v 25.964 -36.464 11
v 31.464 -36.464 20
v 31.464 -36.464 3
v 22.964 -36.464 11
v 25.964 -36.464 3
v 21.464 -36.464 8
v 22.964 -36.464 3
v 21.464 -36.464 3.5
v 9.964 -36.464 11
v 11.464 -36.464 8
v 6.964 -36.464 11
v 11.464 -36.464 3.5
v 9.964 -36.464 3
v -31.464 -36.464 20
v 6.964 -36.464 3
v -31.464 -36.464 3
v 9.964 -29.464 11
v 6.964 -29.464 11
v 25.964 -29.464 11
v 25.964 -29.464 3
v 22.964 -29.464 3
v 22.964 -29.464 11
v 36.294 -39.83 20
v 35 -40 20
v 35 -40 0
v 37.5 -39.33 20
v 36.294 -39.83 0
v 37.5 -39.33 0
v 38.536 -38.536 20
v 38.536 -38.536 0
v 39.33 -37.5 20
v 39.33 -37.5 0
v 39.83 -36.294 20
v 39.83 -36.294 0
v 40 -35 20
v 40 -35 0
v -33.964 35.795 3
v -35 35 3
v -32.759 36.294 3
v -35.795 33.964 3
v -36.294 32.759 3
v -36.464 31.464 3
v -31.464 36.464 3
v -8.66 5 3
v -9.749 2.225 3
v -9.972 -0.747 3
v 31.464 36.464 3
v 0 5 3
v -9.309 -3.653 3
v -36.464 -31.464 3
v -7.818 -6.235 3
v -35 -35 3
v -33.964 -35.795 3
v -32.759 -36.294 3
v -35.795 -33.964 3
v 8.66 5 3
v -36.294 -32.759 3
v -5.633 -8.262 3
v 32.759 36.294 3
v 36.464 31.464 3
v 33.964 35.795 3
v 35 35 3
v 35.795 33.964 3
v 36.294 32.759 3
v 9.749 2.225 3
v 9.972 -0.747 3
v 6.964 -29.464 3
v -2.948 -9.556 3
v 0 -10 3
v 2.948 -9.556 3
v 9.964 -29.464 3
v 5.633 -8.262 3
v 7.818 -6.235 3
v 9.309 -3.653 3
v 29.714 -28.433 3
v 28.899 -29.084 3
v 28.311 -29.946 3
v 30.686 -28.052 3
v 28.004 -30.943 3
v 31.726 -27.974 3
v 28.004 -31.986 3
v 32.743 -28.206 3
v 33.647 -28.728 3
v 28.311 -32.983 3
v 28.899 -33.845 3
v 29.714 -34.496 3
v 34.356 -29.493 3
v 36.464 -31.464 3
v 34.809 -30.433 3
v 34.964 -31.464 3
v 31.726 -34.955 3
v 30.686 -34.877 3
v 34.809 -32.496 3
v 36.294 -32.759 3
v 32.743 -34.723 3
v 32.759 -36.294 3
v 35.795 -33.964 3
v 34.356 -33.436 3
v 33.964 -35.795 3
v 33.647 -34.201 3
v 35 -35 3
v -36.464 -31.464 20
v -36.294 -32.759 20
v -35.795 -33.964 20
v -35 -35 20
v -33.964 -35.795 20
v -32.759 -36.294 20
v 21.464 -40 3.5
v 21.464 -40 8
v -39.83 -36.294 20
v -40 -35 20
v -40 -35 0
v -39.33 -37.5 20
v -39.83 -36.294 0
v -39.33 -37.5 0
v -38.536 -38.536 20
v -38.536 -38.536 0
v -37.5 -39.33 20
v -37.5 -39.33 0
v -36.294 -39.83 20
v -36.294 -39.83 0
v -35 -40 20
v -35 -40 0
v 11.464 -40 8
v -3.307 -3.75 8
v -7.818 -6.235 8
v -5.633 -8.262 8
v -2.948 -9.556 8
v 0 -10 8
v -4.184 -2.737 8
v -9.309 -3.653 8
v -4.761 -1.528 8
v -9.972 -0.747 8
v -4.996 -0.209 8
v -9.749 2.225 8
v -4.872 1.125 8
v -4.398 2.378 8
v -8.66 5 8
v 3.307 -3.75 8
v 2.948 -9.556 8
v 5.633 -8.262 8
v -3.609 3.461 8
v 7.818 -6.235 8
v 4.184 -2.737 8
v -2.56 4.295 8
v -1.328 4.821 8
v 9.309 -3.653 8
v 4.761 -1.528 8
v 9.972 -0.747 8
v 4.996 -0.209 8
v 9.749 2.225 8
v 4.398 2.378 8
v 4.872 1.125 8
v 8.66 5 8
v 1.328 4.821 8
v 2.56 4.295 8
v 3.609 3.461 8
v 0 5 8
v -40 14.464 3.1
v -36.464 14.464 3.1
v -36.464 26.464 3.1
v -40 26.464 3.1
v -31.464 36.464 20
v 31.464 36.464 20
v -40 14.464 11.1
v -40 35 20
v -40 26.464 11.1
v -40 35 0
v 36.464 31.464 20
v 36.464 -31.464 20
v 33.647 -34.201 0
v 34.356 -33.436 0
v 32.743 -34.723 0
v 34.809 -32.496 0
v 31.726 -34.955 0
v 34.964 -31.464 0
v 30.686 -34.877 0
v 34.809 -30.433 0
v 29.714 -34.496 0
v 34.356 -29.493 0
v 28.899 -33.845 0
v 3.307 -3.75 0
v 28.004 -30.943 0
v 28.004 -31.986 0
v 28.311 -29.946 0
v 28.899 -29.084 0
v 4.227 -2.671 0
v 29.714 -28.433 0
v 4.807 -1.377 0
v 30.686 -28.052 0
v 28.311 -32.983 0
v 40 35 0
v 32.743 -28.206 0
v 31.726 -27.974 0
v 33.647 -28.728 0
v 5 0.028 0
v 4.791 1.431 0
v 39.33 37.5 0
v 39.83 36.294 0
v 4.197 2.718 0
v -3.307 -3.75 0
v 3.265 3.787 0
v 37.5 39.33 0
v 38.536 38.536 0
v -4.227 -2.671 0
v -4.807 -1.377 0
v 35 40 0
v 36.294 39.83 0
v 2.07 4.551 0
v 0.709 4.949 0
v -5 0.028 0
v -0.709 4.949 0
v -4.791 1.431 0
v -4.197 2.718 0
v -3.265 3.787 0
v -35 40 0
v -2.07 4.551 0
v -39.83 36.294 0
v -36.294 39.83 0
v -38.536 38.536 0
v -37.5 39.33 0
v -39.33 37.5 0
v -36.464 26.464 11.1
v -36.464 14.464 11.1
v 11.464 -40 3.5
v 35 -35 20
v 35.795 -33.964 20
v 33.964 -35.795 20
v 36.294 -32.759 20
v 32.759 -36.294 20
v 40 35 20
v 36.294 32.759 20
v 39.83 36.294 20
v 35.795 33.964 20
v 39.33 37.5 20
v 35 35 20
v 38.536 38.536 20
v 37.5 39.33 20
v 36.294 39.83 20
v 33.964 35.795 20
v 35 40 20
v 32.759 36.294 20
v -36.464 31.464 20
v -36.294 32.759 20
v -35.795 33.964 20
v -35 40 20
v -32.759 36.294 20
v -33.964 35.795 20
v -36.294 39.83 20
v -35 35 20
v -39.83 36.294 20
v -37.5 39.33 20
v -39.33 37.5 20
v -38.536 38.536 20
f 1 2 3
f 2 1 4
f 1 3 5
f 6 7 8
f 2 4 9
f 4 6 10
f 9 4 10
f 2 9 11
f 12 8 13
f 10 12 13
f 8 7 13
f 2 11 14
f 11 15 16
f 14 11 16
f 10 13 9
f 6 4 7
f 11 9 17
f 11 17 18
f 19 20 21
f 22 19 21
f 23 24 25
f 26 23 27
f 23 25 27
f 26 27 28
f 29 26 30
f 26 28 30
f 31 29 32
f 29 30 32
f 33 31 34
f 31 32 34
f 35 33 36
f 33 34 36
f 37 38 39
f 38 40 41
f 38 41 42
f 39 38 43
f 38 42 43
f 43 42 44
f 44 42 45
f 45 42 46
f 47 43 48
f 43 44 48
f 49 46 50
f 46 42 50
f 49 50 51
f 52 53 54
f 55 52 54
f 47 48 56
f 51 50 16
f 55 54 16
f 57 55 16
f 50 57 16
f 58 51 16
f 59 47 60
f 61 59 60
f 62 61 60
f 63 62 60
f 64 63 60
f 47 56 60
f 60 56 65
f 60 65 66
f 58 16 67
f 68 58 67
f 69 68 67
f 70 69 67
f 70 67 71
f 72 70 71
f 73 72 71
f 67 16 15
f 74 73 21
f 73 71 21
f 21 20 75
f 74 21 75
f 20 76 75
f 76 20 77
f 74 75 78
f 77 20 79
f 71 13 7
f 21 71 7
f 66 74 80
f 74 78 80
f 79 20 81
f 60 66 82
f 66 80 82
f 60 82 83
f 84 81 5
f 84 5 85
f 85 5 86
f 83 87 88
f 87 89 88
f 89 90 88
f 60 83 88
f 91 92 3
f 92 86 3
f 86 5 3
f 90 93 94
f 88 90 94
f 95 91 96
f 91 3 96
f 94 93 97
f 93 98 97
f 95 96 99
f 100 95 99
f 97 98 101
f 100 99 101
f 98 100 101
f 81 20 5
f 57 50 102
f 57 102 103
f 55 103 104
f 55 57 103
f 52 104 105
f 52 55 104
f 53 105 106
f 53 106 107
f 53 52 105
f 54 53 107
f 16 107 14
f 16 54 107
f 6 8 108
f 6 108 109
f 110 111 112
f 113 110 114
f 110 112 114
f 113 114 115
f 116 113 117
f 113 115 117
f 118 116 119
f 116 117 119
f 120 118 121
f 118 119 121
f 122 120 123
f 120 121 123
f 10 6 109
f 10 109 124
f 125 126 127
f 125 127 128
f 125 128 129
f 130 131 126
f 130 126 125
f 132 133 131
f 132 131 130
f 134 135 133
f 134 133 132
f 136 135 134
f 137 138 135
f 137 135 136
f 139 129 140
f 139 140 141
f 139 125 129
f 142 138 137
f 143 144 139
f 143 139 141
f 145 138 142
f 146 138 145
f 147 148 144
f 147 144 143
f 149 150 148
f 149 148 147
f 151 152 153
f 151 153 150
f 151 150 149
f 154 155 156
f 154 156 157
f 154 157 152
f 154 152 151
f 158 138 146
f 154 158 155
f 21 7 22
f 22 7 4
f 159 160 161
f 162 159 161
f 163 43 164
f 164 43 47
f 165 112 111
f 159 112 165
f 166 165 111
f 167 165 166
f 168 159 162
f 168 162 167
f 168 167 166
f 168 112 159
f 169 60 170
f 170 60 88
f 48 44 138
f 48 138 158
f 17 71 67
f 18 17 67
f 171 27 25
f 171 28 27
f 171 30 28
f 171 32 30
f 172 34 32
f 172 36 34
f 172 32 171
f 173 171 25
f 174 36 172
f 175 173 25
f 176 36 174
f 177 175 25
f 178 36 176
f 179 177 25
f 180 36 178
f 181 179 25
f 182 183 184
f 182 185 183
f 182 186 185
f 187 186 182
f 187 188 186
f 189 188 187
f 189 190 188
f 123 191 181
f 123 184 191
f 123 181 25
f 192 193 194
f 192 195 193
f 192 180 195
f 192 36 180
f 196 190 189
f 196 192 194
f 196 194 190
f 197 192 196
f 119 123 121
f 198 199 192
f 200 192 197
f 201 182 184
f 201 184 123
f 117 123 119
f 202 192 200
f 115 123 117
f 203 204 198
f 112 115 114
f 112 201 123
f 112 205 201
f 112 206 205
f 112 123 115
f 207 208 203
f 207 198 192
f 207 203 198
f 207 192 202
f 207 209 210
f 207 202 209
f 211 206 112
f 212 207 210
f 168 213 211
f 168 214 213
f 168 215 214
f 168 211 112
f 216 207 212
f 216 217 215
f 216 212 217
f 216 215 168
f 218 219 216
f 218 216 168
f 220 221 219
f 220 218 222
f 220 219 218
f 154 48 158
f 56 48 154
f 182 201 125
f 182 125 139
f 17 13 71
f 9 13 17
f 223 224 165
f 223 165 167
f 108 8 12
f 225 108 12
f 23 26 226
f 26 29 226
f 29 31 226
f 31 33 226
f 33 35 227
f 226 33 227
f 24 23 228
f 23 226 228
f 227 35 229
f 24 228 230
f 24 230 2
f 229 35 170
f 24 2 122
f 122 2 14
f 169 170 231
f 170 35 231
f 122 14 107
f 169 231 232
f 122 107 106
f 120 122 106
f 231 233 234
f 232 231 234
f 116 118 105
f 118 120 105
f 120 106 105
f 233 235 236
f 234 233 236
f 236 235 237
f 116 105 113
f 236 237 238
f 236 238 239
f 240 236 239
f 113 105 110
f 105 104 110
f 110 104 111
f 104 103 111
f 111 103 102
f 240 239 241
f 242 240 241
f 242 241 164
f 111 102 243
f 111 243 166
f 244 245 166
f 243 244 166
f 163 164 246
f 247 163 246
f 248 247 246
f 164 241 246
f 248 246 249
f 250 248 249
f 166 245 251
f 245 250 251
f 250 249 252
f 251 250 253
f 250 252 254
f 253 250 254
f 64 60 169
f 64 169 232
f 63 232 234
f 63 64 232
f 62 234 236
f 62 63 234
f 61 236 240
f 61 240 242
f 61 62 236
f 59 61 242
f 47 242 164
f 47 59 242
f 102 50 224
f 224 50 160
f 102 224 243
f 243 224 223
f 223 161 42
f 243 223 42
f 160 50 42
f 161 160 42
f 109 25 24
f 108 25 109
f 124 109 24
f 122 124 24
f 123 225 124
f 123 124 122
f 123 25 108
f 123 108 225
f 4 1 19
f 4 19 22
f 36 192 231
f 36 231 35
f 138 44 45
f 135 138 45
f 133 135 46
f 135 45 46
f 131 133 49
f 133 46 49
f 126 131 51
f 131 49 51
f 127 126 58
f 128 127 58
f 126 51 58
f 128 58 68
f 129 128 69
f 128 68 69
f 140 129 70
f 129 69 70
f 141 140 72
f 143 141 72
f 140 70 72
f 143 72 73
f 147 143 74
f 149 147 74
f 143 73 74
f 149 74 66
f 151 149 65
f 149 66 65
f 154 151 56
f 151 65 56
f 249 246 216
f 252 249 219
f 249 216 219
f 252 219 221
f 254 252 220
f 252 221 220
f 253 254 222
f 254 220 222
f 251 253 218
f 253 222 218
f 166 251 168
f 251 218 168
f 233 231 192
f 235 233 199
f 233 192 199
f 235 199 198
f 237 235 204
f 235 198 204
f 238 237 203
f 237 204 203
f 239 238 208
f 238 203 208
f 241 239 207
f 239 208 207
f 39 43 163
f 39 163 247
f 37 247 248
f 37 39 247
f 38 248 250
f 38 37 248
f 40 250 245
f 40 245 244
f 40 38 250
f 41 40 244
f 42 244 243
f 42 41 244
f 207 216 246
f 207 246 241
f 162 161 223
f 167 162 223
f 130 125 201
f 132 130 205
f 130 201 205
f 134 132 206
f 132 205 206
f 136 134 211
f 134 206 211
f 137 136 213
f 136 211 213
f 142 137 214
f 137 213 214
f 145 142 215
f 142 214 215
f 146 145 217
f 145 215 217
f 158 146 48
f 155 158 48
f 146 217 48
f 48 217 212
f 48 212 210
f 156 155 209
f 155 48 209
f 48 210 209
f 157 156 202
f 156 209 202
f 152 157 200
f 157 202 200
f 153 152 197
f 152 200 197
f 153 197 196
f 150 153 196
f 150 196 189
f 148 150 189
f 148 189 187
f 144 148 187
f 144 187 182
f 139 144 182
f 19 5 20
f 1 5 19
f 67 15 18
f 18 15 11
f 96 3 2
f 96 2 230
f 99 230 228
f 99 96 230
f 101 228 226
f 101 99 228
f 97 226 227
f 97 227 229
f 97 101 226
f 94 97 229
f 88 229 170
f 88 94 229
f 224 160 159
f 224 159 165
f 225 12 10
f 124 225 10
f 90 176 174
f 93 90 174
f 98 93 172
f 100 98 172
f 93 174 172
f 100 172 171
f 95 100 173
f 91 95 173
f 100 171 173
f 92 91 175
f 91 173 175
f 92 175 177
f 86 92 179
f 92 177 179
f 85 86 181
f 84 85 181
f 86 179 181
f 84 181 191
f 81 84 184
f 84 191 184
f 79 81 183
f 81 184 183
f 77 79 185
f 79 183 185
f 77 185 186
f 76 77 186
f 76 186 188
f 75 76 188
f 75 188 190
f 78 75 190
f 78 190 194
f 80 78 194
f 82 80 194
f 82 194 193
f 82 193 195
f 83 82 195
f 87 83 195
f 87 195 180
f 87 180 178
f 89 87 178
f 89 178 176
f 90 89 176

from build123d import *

# Parameters (mm, degrees)
PAD_DEPTH       = 20
SKETCH001_W     = 75
SKETCH001_H     = 75
PAD001_DEPTH    = 3
SKETCH003_W     = 10
SKETCH003_H     = 4.5
POCKET001_DEPTH = 3.535534
SKETCH004_W     = 3
SKETCH004_H     = 8
PAD002_DEPTH    = 7
PAD003_DEPTH    = 5
SKETCH006_W     = 12
SKETCH006_H     = 8
POCKET002_DEPTH = 3.535534
SKETCH002_R     = 3.5
POCKET_DEPTH    = 8


with BuildPart() as part:
    # Sketch → Pad (new body)
    with BuildSketch(Plane.XY):
        with BuildLine():
            Line((-35, 40), (35, 40))
            ThreePointArc((40, 35), (38.535534, 38.535534), (35, 40))
            Line((40, 35), (40, -35))
            ThreePointArc((35, -40), (38.535534, -38.535534), (40, -35))
            Line((35, -40), (-35, -40))
            ThreePointArc((-40, -35), (-38.535534, -38.535534), (-35, -40))
            Line((-40, -35), (-40, 35))
            ThreePointArc((-35, 40), (-38.535534, 38.535534), (-40, 35))
        make_face()
        with BuildLine():
            Line((-31.464466, 36.464466), (31.464466, 36.464466))
            ThreePointArc((36.464466, 31.464466), (35, 35), (31.464466, 36.464466))
            Line((36.464466, 31.464466), (36.464466, -31.464466))
            ThreePointArc((31.464466, -36.464466), (35, -35), (36.464466, -31.464466))
            Line((31.464466, -36.464466), (-31.464466, -36.464466))
            ThreePointArc((-36.464466, -31.464466), (-35, -35), (-31.464466, -36.464466))
            Line((-36.464466, -31.464466), (-36.464466, 31.464466))
            ThreePointArc((-31.464466, 36.464466), (-35, 35), (-36.464466, 31.464466))
        make_face(mode=Mode.SUBTRACT)
    extrude(amount=PAD_DEPTH)

    # Sketch001 (on Face17 of Pad) → Pad001 (join)
    with BuildSketch(Plane(origin=(0, 0, 0), x_dir=(1, 0, 0), z_dir=(0, 0, -1))):
        Rectangle(SKETCH001_W, SKETCH001_H)
    extrude(amount=-PAD001_DEPTH)

    # Sketch003 → Pocket001 (cut)
    with BuildSketch(Plane(origin=(0, -36.464466, 0), x_dir=(-1, 0, 0), z_dir=(0, 1, 0))):
        with Locations((-16.464466, 5.75)):
            Rectangle(SKETCH003_W, SKETCH003_H)
    extrude(amount=-POCKET001_DEPTH, mode=Mode.SUBTRACT)

    # Sketch004 (on Face15 of Pocket001) → Pad002 (join)
    with BuildSketch(Plane(origin=(0, -36.464466, 0), x_dir=(-1, 0, 0), z_dir=(0, 1, 0))):
        with Locations((-24.464466, 7)):
            Rectangle(SKETCH004_W, SKETCH004_H)
        with Locations((-8.464466, 7)):
            Rectangle(SKETCH004_W, SKETCH004_H)
    extrude(amount=PAD002_DEPTH)

    # Sketch005 (on Face25 of Pad002) → Pad003 (join)
    with BuildSketch(Plane.XY.offset(3)):
        with BuildLine():
            ThreePointArc((-8.660254, 5), (0, -10), (8.660254, 5))
            Line((-8.660254, 5), (8.660254, 5))
        make_face()
    extrude(amount=PAD003_DEPTH)

    # Sketch006 → Pocket002 (cut)
    with BuildSketch(Plane.YZ.offset(-36.464466)):
        with Locations((20.464466, 7.1)):
            Rectangle(SKETCH006_W, SKETCH006_H)
    extrude(amount=-POCKET002_DEPTH, mode=Mode.SUBTRACT)

    # Sketch002 (on Face20 of Pad001) → Pocket (cut)
    with BuildSketch(Plane(origin=(0, 0, 0), x_dir=(1, 0, 0), z_dir=(0, 0, -1))):
        with Locations((31.464466, 31.464466)):
            Circle(SKETCH002_R)
        with BuildLine():
            ThreePointArc((-3.307189, 3.75), (0, -5), (3.307189, 3.75))
            Line((-3.307189, 3.75), (3.307189, 3.75))
        make_face()
    extrude(amount=-POCKET_DEPTH, mode=Mode.SUBTRACT)


solid = part.part
